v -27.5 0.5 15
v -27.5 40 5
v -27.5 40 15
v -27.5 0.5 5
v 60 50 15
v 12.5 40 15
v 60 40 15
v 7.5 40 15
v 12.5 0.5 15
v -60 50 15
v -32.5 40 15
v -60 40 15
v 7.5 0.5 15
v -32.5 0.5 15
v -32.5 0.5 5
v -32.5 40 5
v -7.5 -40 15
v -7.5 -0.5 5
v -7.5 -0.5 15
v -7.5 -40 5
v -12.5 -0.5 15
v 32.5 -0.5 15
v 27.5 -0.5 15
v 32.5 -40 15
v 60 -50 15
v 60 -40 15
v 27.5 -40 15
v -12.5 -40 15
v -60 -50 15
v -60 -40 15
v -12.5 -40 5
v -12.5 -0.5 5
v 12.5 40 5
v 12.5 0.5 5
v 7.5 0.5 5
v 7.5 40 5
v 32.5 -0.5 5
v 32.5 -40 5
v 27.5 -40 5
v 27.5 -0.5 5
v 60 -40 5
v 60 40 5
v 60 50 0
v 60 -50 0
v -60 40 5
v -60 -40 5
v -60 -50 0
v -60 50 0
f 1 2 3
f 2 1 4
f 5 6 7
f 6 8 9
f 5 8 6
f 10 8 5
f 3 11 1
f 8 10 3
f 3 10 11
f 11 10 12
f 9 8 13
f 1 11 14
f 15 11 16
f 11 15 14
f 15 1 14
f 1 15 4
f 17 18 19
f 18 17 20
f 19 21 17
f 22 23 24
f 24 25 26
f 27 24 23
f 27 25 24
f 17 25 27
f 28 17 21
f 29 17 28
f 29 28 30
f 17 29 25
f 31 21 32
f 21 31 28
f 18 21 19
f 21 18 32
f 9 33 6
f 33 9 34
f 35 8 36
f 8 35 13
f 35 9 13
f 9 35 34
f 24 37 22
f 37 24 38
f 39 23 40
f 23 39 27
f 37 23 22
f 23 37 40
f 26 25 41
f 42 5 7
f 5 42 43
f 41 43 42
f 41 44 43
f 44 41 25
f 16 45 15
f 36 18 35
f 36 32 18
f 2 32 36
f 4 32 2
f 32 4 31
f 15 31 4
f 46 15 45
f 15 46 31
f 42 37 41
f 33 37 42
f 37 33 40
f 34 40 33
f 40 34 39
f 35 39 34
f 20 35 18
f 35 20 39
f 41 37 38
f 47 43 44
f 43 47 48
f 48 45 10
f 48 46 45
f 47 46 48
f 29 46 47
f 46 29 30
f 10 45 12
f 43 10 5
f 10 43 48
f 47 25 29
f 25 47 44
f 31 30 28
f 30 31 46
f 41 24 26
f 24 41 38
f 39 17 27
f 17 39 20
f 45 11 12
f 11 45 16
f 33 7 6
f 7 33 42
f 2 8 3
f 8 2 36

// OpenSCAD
$fn = 32;

// ----------------------------------------------------------------------
// Rib frame 120 x 100 x 15
// 4 ribs at 20 mm pitch, staggered
// ----------------------------------------------------------------------

// --- parameters (mm) ---
frame = [120, 100, 5];  // base plate size (x, y, z)
rail_w = 10;            // side rail width
ribs = 4;               // number of ribs
rib_t = 5;              // rib thickness
rib_h = 10;             // rib height above the base plate
pitch = 20;             // pitch between rib centres

// --- derived feature positions (mm) ---
span = (ribs - 1) * pitch;          // = 60   distance between the outer ribs
origin_x = -span / 2;               // = -30   X of the first rib
rib_len = frame[1] / 2 - rail_w + 0.5;  // = 40.5   length of a staggered rib
rib_y = 0.5 + rib_len / 2;          // = 20.75   Y of a staggered rib centre
row_offset = 2 * rib_y;             // = 41.5   distance between the two rows
feature_centers = [
  [origin_x + 0 * pitch, rib_y],
  [origin_x + 1 * pitch, -rib_y],
  [origin_x + 2 * pitch, rib_y],
  [origin_x + 3 * pitch, -rib_y]
];   // rib centre line, drives the rib loop

// base plate, two side rails, then the ribs read straight off feature_centers
union() {
  translate([-frame[0] / 2, -frame[1] / 2, 0]) cube(frame);
  translate([-frame[0] / 2, -frame[1] / 2, 0]) cube([frame[0], rail_w, frame[2] + rib_h]);
  translate([-frame[0] / 2, frame[1] / 2 - rail_w, 0]) cube([frame[0], rail_w, frame[2] + rib_h]);
  for (centre = feature_centers)
    translate([centre[0] - rib_t / 2, centre[1] - rib_len / 2, frame[2] - 1])
      cube([rib_t, rib_len, rib_h + 1]);
}
